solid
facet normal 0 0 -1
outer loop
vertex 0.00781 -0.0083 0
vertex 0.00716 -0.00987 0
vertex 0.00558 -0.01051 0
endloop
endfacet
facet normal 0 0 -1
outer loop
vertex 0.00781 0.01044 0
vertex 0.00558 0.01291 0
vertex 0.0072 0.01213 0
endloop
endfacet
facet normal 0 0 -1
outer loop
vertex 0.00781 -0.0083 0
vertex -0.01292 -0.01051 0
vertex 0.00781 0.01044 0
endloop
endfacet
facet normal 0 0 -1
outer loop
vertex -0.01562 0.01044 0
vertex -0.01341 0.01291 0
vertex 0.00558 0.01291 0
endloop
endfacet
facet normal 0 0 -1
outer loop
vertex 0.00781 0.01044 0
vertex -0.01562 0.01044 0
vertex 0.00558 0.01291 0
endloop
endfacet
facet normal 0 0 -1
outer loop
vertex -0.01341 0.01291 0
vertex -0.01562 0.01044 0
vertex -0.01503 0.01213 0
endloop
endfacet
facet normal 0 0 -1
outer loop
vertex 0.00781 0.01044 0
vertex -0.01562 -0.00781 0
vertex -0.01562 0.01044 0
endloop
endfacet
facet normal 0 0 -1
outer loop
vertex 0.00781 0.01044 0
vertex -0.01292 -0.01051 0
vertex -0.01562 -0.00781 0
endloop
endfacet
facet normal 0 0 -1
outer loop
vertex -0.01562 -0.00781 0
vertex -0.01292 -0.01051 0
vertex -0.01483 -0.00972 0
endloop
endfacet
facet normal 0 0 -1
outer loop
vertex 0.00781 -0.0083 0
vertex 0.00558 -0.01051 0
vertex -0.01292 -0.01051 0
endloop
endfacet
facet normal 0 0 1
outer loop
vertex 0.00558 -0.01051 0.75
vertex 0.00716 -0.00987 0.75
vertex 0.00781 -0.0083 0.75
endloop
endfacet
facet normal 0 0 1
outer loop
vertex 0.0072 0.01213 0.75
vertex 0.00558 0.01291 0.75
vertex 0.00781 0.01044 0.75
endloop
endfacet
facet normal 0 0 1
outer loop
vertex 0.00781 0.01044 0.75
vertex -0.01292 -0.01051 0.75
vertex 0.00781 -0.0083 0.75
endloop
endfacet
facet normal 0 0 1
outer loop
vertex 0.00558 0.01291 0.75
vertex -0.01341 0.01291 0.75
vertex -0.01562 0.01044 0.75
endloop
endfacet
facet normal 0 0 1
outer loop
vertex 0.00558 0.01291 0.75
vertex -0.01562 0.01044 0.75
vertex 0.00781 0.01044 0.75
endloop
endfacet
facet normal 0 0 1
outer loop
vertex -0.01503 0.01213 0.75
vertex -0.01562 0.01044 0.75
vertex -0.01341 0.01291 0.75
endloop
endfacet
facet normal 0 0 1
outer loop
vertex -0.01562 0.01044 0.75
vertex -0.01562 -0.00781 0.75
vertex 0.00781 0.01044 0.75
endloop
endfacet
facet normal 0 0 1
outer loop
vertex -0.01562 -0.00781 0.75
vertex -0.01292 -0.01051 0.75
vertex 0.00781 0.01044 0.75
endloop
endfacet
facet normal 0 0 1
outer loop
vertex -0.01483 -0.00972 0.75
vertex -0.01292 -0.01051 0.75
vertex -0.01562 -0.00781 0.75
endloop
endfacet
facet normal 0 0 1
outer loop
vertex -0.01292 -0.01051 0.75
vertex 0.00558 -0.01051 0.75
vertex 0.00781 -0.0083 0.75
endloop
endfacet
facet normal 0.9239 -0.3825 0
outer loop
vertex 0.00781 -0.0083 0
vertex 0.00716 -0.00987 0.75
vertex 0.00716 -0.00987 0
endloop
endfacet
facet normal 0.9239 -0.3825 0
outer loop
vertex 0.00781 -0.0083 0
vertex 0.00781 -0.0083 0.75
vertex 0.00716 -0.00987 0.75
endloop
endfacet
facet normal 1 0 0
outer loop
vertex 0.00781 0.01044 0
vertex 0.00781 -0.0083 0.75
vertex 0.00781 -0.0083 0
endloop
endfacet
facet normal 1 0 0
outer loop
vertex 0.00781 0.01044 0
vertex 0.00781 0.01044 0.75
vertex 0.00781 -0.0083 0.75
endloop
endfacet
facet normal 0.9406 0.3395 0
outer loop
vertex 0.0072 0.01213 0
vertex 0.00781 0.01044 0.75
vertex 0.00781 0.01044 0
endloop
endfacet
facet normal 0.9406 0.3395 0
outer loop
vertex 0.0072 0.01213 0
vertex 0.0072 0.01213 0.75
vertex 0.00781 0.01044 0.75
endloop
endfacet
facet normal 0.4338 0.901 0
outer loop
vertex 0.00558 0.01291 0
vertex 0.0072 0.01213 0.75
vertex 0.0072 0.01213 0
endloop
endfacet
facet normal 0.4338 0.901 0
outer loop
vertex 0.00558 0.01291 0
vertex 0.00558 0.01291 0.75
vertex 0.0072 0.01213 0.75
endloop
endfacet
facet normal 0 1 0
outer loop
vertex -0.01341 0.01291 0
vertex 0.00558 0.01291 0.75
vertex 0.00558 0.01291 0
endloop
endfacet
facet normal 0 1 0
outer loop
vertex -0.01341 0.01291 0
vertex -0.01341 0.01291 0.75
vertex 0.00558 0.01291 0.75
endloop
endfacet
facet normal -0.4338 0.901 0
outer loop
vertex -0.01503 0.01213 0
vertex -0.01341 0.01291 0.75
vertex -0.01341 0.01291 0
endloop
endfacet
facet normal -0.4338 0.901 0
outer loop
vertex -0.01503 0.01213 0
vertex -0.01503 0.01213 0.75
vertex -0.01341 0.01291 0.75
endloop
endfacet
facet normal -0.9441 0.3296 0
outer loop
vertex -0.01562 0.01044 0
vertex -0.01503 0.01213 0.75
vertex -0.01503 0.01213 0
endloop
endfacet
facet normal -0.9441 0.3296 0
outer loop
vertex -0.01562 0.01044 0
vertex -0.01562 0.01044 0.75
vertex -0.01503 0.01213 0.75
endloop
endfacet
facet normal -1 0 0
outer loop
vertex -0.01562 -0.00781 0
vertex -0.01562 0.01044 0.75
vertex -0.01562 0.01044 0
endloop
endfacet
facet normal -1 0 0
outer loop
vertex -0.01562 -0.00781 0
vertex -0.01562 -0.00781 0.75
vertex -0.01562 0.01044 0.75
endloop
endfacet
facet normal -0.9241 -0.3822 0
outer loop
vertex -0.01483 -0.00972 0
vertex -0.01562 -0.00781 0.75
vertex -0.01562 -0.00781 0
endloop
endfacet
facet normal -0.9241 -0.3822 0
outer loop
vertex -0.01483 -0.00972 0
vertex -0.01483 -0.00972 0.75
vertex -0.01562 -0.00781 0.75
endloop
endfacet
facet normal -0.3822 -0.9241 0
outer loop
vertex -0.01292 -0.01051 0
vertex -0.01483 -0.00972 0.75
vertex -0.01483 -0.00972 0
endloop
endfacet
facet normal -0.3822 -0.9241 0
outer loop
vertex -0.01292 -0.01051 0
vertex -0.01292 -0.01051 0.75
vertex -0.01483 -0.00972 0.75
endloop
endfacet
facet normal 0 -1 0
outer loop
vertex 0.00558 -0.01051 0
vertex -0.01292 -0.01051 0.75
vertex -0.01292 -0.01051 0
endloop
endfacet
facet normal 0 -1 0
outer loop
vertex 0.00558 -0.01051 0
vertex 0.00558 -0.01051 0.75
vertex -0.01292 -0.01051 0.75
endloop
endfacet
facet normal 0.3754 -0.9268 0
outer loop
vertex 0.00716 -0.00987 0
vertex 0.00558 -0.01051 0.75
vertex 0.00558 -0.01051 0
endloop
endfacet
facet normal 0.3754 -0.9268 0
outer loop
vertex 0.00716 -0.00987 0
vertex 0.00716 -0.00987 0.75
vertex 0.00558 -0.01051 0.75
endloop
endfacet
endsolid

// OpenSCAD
EPS = 0.01;

translate([-0.015625, -0.0078125, 0])
linear_extrude(height=0.75)
    polygon(points=[
        [0.0, 0.0],
        [0.0007948582418457166, -0.0019189575476279677],
        [0.0027138157894736844, -0.0027138157894736844],
        [0.021217105263157895, -0.0027138157894736844],
        [0.022787161438489866, -0.00206347722796355],
        [0.0234375, -0.000493421052631579],
        [0.0234375, 0.018256578947368422],
        [0.02283825686147997, 0.019949990385858287],
        [0.021217105263157895, 0.020723684210526318],
        [0.0022203947368421052, 0.020723684210526318],
        [0.0005992431385200307, 0.019949990385858287],
        [0.0, 0.018256578947368422],
        [0.0, 0.0]
    ]);
